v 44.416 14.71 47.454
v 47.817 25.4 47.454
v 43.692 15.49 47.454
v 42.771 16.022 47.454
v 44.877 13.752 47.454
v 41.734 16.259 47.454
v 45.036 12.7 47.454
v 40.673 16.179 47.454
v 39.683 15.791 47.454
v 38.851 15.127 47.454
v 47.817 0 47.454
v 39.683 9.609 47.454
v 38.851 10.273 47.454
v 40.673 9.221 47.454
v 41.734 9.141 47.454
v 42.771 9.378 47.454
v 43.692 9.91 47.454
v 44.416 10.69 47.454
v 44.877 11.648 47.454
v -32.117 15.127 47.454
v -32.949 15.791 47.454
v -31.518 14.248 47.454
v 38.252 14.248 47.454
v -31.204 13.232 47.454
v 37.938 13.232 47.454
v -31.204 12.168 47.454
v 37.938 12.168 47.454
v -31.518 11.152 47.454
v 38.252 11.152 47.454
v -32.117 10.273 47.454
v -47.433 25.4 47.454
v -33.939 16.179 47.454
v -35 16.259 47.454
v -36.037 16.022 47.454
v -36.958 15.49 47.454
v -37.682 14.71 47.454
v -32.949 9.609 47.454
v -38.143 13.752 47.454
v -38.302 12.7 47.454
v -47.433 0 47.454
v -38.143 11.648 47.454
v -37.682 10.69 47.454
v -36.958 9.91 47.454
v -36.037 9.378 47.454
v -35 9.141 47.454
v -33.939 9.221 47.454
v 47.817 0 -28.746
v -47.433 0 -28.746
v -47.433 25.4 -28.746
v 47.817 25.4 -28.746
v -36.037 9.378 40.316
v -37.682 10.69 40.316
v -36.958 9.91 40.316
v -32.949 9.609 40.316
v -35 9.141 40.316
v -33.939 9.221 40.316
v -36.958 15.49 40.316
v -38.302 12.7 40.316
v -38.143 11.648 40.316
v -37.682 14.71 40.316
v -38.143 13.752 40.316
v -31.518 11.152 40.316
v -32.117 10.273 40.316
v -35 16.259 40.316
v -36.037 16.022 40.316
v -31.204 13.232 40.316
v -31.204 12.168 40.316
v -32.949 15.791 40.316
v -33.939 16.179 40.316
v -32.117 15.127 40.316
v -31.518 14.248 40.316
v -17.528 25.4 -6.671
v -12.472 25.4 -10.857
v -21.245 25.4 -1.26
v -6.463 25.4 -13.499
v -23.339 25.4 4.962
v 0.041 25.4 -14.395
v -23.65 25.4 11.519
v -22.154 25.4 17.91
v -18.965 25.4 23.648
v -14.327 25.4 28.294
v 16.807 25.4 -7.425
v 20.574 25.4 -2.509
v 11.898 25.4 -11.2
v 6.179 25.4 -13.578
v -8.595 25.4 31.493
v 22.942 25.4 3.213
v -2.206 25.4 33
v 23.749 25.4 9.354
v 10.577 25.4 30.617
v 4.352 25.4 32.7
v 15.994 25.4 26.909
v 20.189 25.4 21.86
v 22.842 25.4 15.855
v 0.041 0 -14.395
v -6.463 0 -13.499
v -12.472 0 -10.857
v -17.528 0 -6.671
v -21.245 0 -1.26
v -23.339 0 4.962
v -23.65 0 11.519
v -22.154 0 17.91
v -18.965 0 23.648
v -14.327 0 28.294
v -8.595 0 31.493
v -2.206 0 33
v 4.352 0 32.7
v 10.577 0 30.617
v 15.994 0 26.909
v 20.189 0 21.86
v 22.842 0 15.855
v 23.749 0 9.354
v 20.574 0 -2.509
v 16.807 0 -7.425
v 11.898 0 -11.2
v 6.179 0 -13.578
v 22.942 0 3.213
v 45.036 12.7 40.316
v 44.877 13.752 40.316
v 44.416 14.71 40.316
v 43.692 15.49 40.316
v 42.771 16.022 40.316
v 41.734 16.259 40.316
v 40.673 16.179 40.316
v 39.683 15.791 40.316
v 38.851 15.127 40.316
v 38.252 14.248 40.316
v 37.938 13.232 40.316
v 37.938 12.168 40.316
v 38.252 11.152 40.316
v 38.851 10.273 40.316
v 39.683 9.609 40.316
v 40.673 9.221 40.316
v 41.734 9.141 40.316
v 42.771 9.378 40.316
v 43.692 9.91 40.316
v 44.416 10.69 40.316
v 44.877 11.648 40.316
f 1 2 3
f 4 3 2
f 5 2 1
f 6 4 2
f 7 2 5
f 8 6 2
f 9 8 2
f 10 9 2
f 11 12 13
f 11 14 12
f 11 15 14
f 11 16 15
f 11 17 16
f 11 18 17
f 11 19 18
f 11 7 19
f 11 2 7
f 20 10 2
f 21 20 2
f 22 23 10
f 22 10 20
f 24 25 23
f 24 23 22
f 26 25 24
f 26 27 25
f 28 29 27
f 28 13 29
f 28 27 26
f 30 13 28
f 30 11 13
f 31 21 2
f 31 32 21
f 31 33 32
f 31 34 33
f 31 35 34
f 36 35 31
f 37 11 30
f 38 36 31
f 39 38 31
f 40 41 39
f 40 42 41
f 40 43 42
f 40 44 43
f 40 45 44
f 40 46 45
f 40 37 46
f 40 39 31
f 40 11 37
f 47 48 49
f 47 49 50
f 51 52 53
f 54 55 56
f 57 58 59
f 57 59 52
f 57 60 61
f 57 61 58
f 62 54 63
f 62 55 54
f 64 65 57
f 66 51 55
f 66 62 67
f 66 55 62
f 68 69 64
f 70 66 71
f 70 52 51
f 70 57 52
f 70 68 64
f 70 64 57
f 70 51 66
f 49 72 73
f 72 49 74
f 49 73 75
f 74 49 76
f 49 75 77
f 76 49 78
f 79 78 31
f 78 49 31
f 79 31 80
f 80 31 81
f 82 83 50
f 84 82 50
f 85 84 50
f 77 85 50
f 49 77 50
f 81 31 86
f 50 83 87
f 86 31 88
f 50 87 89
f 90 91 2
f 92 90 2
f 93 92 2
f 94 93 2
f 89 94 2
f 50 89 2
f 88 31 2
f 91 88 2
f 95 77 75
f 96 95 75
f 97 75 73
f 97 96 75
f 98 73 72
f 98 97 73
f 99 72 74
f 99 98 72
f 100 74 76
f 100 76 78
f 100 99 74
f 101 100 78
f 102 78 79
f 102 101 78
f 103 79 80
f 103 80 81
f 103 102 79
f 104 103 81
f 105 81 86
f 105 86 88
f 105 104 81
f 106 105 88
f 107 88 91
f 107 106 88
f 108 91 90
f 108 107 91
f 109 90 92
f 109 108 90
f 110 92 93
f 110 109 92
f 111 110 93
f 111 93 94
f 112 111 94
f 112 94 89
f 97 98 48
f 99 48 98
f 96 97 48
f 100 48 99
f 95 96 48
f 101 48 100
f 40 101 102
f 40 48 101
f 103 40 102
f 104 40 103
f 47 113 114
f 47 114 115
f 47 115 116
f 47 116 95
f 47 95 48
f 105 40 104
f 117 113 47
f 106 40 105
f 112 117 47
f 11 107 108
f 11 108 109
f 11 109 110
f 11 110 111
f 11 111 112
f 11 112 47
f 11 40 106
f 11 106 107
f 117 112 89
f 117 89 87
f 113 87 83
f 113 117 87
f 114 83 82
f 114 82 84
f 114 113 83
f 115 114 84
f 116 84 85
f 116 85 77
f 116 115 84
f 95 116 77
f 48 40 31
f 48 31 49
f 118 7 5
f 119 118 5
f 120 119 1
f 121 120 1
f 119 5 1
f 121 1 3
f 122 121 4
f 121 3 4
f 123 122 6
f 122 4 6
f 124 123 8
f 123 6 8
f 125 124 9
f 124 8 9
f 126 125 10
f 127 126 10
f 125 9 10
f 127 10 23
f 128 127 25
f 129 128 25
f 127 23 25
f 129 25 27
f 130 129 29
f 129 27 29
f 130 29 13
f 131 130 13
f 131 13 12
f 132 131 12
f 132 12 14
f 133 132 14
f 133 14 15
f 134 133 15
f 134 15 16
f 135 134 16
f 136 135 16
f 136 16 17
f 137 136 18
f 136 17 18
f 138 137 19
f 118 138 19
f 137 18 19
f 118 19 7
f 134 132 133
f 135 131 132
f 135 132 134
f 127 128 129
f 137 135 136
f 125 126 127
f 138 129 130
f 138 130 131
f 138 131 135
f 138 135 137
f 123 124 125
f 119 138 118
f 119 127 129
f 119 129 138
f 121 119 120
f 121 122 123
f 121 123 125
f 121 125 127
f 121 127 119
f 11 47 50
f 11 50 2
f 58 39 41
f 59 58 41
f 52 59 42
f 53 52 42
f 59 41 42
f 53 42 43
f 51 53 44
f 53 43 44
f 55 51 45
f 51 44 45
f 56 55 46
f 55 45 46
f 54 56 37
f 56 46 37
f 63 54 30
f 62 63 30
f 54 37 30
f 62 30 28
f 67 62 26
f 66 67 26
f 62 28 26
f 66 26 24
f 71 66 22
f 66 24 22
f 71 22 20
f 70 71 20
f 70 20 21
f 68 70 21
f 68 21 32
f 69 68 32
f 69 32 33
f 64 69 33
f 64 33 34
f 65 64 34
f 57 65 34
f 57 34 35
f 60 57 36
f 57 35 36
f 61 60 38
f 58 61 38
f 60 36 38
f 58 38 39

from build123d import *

# Parameters (mm, degrees)
F1_DEPTH = 25.4
F3_DEPTH = 7.1374
F5_DEPTH = 7.1374


with BuildPart() as f1:
    # F0 (on Front) → F1 (new body)
    with BuildSketch(Plane.XZ):
        with BuildLine():
            ThreePointArc((23.749, 9.35351), (-16.807393, 26.132263), (0.040503, -14.395455))
            ThreePointArc((0.040503, -14.395455), (16.807393, -7.425243), (23.749, 9.35351))
        make_face()
        Polygon((47.816977, 47.453566), (-47.433023, 47.453566), (-47.433023, -28.746434), (0.064977, -28.746434), (47.816977, -28.746434), align=None)
        with BuildLine():
            ThreePointArc((23.749, 9.35351), (16.807393, -7.425243), (0.040503, -14.395455))
            ThreePointArc((0.040503, -14.395455), (-16.807393, 26.132263), (23.749, 9.35351))
        make_face(mode=Mode.SUBTRACT)
    extrude(amount=-F1_DEPTH)

    # F2 (on face) → F3 (cut)
    with BuildSketch(Plane.XY.offset(47.453566)):
        with BuildLine():
            ThreePointArc((-31.164323, 12.7), (-34.733023, 16.2687), (-38.301723, 12.7))
            Line((-38.301723, 12.7), (-34.733023, 12.7))
            Line((-34.733023, 12.7), (-31.164323, 12.7))
        make_face()
        with BuildLine():
            Line((-34.733023, 12.7), (-38.301723, 12.7))
            ThreePointArc((-38.301723, 12.7), (-34.733023, 9.1313), (-31.164323, 12.7))
            Line((-31.164323, 12.7), (-34.733023, 12.7))
        make_face()
    extrude(amount=-F3_DEPTH, mode=Mode.SUBTRACT)

    # F4 (on face) → F5 (cut)
    with BuildSketch(Plane.XY.offset(47.453566)):
        with BuildLine():
            ThreePointArc((37.898277, 12.7), (41.466977, 9.1313), (45.035677, 12.7))
            ThreePointArc((45.035677, 12.7), (41.466977, 16.2687), (37.898277, 12.7))
        make_face()
    extrude(amount=-F5_DEPTH, mode=Mode.SUBTRACT)


solid = f1.part
